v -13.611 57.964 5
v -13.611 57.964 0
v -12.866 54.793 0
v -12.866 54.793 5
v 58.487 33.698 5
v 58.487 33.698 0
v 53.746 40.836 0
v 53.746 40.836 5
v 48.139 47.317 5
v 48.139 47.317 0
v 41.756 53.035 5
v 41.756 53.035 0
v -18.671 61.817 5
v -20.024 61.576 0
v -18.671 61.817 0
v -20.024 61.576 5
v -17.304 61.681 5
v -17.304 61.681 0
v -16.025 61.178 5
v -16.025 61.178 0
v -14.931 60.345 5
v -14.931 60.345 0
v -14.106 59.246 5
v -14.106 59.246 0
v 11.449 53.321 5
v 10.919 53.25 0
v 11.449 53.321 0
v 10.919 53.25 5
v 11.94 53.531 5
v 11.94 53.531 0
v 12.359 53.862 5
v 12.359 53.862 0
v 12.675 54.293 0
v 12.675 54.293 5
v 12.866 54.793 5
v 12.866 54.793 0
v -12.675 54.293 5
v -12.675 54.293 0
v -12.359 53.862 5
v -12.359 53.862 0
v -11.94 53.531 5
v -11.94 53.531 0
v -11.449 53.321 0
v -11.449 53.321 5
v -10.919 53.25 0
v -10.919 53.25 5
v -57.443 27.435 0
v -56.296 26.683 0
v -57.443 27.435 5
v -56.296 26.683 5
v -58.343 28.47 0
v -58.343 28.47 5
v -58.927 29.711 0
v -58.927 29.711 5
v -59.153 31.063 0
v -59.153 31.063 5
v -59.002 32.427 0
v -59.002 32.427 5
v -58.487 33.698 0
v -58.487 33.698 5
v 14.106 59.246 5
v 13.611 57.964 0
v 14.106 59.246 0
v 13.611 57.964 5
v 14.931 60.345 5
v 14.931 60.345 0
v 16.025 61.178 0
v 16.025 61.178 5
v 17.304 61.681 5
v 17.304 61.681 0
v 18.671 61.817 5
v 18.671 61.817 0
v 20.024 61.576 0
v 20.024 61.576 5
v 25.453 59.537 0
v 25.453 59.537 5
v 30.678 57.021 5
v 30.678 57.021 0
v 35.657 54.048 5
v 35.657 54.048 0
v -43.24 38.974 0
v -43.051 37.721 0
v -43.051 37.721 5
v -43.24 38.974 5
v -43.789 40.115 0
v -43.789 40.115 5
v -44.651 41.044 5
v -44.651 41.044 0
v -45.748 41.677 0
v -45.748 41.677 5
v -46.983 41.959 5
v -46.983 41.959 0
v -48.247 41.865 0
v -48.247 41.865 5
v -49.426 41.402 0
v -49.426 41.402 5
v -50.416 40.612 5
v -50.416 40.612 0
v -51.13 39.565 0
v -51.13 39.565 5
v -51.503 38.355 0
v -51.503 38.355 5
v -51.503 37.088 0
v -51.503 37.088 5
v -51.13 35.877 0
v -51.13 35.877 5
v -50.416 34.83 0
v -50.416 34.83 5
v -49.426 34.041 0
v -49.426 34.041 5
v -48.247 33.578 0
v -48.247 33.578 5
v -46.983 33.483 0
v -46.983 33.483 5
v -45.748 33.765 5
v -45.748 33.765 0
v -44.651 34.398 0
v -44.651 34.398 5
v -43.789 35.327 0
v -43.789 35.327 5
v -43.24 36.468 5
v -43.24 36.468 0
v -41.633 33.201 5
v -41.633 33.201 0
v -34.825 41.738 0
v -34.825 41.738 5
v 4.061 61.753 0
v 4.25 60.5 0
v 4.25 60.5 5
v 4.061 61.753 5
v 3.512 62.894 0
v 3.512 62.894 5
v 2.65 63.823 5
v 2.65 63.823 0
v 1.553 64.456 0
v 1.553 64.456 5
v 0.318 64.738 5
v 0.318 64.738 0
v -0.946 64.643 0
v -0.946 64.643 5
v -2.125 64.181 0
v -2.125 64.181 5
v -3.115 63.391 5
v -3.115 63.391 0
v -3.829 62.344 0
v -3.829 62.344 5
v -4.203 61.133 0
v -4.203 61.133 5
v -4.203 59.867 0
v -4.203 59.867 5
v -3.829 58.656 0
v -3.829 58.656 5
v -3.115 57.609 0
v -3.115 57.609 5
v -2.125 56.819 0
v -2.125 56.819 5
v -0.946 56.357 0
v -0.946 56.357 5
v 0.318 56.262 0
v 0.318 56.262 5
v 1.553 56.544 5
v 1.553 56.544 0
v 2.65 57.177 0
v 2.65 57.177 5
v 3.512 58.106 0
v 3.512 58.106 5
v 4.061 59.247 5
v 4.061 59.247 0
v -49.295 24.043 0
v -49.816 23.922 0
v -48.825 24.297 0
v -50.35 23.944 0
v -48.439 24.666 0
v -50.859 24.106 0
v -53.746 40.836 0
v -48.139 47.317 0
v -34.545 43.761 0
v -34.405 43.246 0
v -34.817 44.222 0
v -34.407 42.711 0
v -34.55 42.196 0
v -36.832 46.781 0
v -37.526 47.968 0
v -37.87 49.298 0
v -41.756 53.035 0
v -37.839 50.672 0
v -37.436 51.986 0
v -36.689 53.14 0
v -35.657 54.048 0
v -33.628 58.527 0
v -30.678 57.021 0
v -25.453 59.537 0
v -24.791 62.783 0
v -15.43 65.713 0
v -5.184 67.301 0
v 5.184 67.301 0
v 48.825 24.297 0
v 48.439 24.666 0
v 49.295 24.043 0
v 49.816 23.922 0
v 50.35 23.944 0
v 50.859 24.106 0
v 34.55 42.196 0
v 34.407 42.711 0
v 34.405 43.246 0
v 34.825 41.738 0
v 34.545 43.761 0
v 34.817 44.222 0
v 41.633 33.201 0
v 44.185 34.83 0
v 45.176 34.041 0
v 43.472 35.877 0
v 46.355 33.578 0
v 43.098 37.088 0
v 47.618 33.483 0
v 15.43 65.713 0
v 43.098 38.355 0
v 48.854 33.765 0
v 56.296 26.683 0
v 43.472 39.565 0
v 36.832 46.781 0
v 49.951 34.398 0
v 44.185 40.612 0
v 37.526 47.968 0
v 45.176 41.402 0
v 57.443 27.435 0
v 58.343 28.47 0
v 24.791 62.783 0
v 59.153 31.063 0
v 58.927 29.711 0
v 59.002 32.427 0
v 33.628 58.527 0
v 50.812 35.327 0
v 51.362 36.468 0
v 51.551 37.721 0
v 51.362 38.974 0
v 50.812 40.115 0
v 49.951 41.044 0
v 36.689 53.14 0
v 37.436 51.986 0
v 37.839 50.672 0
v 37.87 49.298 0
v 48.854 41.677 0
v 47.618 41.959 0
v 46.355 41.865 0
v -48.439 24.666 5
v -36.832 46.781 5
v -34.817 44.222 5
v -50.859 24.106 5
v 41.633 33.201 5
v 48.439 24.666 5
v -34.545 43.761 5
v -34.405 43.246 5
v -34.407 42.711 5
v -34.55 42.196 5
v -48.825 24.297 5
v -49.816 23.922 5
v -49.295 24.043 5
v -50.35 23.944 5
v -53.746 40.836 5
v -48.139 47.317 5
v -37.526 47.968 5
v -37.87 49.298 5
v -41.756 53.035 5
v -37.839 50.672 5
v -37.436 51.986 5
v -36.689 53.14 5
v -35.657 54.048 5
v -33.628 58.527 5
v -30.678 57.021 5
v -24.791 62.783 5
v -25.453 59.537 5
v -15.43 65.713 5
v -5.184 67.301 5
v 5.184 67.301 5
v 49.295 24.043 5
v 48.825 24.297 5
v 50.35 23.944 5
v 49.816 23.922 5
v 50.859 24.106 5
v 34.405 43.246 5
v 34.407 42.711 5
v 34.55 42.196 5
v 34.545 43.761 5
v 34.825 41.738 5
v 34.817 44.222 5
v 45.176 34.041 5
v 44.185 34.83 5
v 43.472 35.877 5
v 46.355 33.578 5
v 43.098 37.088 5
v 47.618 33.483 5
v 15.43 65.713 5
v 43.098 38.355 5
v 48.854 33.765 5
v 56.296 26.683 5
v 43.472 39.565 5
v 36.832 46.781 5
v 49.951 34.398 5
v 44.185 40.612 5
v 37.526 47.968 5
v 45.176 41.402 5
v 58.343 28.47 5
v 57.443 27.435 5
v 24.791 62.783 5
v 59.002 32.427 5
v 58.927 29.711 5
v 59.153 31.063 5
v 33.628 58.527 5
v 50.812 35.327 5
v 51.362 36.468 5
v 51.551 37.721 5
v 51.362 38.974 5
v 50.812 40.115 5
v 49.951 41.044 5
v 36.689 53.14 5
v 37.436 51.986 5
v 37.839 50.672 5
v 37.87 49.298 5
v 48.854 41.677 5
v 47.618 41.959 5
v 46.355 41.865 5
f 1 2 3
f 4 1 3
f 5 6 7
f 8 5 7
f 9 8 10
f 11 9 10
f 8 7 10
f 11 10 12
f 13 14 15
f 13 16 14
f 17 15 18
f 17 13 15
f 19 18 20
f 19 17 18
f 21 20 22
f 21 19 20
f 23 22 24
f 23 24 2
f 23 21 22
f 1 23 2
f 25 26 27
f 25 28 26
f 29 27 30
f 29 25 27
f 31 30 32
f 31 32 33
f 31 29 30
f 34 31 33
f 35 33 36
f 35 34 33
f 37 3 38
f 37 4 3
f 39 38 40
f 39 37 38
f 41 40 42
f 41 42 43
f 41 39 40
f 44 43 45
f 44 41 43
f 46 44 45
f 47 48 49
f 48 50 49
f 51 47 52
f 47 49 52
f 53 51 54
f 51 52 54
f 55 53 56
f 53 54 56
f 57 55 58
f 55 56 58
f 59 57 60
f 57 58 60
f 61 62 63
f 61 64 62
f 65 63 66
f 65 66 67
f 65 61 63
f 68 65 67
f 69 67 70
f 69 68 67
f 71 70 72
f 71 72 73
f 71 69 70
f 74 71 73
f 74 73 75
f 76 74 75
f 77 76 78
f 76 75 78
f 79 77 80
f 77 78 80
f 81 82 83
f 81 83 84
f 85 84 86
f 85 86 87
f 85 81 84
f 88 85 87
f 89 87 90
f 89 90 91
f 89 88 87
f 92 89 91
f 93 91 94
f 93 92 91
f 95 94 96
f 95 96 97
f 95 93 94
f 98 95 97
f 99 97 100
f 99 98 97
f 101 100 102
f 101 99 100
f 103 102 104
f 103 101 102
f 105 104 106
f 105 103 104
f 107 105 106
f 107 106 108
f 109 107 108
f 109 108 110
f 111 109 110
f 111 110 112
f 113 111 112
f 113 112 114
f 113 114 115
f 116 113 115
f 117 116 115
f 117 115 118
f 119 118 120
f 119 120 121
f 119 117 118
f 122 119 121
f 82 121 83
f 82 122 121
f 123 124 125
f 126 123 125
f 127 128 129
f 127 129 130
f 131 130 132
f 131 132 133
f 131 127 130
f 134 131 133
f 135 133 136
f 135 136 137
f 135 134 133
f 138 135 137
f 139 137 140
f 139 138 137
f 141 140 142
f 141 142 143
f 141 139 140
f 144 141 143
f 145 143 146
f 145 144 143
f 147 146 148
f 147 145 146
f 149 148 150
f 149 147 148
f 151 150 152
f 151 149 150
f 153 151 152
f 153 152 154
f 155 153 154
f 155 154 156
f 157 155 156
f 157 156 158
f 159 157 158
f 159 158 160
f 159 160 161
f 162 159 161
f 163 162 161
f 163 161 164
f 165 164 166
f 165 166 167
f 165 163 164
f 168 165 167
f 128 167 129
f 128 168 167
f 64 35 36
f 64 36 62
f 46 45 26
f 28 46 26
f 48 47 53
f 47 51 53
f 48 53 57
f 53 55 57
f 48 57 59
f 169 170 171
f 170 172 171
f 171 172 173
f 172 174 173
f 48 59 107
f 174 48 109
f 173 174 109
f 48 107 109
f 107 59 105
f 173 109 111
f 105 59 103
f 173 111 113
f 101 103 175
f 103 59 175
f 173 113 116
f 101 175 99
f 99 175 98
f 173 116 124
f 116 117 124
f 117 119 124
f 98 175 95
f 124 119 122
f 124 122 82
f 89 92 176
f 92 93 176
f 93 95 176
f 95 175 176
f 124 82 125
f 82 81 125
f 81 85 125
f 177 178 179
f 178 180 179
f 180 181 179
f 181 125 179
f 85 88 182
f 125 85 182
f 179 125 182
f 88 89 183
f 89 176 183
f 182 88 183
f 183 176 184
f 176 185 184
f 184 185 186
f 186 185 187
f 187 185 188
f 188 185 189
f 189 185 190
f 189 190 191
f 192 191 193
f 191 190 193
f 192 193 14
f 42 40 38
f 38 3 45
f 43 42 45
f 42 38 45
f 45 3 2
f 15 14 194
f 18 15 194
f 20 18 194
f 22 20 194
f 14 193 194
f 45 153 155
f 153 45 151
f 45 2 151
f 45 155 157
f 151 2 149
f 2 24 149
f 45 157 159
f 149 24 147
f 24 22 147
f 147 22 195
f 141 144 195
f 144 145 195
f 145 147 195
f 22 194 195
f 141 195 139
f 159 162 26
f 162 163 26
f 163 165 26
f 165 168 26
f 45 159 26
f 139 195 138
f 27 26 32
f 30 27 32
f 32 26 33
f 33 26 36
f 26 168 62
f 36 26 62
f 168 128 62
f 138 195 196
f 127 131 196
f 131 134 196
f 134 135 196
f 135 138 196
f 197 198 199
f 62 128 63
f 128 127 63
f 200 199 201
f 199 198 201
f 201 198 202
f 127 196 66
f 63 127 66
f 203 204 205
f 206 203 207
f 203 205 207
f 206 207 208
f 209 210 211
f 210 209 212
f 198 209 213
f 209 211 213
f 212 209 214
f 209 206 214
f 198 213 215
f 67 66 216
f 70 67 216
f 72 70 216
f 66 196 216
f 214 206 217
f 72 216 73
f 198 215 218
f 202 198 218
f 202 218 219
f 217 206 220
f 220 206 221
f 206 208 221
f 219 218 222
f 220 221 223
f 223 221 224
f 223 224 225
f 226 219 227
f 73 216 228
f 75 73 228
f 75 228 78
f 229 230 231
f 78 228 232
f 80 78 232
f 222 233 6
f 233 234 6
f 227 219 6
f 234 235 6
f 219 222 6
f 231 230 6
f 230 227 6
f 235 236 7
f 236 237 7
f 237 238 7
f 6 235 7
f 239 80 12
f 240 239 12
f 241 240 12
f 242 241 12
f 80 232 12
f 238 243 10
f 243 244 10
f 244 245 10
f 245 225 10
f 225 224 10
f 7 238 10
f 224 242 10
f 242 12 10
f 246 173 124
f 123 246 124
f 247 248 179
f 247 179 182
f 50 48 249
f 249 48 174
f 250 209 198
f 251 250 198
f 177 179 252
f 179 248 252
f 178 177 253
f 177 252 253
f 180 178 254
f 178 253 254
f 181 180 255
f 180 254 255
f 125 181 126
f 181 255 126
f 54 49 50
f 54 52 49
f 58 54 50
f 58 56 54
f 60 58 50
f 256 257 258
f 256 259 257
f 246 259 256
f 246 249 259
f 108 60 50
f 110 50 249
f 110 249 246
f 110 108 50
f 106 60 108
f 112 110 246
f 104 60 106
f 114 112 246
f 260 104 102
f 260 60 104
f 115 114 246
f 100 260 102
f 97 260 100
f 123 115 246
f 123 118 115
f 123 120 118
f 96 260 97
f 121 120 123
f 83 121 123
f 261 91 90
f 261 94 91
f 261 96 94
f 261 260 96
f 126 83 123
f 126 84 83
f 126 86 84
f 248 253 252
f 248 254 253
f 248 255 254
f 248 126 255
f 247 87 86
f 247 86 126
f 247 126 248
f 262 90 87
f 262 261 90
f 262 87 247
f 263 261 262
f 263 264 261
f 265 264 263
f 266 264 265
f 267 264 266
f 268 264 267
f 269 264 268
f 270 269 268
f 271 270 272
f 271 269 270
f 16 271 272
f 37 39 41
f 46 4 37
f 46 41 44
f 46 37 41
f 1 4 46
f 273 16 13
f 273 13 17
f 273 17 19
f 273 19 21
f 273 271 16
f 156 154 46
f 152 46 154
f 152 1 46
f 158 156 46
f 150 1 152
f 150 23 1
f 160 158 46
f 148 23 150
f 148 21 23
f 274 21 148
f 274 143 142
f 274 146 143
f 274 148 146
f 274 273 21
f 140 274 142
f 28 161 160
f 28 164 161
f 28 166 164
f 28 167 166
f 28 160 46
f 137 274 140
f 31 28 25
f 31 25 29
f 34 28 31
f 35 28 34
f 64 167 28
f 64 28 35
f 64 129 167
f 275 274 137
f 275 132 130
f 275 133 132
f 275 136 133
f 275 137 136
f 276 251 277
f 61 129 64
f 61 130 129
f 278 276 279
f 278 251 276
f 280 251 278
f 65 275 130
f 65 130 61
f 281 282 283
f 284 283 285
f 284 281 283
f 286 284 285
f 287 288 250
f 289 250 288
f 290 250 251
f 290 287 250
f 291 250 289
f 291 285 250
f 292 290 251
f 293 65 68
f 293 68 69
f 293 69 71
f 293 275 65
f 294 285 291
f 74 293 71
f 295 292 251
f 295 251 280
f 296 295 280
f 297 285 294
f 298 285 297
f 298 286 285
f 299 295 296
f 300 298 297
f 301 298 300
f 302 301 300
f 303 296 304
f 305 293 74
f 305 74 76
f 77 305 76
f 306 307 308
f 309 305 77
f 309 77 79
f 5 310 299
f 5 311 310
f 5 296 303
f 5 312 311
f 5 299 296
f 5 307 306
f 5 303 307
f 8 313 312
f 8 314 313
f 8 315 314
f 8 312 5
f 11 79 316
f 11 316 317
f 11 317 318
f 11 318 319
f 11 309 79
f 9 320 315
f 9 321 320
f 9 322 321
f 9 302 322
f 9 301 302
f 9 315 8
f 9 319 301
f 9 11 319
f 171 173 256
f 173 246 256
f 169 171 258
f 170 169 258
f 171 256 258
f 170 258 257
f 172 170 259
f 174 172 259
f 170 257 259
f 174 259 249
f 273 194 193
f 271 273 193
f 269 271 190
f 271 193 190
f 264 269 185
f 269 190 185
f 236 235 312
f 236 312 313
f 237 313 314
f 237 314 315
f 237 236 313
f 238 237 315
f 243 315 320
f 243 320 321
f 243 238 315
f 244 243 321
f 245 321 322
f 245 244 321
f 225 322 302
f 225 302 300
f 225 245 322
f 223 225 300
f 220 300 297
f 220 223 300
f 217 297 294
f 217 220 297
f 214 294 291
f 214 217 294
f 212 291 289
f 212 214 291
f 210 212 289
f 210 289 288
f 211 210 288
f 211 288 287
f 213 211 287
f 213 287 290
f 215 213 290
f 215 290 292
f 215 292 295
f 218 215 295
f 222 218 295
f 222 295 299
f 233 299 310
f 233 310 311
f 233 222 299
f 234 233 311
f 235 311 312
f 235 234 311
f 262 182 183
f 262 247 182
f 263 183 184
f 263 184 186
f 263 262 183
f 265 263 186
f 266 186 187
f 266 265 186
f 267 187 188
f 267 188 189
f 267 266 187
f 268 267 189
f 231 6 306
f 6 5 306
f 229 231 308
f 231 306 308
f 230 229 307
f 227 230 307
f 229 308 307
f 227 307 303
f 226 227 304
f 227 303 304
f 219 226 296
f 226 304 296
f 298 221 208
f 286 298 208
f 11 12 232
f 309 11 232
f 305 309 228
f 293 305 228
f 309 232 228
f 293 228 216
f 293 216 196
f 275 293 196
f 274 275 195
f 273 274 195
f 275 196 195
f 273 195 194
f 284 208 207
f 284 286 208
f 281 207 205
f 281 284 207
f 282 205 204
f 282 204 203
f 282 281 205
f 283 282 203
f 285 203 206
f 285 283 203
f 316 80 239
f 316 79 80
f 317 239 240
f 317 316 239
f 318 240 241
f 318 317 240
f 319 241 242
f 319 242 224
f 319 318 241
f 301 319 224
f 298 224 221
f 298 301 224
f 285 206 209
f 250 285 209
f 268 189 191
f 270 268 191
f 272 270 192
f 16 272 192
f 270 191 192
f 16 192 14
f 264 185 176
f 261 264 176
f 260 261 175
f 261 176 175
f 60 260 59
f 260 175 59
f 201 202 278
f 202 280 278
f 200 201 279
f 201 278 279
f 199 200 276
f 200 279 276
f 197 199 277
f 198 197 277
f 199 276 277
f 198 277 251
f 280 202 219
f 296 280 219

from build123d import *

# Parameters (mm, degrees)
ESQUISSE2_R        = 4.25
BOSS_EXTRU_1_DEPTH = 5
CONG_1_R           = 5
CONG_2_R           = 2


with BuildPart() as part:
    # Esquisse2 → Boss.-Extru.1 (new body)
    with BuildSketch(Plane.XY):
        with BuildLine():
            Line((-41.632526167, 33.200832294), (-33.836607647, 42.976604913))
            Line((-33.836607647, 42.976604913), (-40.054629461, 50.874248484))
            Line((-40.054629461, 50.874248484), (-41.75579133, 53.034930852))
            ThreePointArc((-41.75579133, 53.034930852), (-52.772575719, 42.086877432), (-60.995330499, 28.91054578))
            Line((-60.995330499, 28.91054578), (-49.426698361, 23.427249496))
            Line((-49.426698361, 23.427249496), (-41.632526167, 33.200832294))
        make_face()
        with Locations((-47.300804689, 37.721133012)):
            Circle(ESQUISSE2_R, mode=Mode.SUBTRACT)
        with BuildLine():
            Line((-41.75579133, 53.034930852), (-40.054629461, 50.874248484))
            ThreePointArc((-40.054629461, 50.874248484), (-28.093972108, 58.337734197), (-14.801436125, 63.035545438))
            Line((-14.801436125, 63.035545438), (-15.430068548, 65.712730765))
            ThreePointArc((-15.430068548, 65.712730765), (-29.28715239, 60.815398583), (-41.75579133, 53.034930852))
        make_face()
        with BuildLine():
            Line((-14.801436125, 63.035545438), (-12.503682933, 53.25))
            Line((-12.503682933, 53.25), (0, 53.25))
            Line((0, 53.25), (12.503682933, 53.25))
            Line((12.503682933, 53.25), (14.801436125, 63.035545438))
            Line((14.801436125, 63.035545438), (15.430068548, 65.712730765))
            ThreePointArc((15.430068548, 65.712730765), (0, 67.5), (-15.430068548, 65.712730765))
            Line((-15.430068548, 65.712730765), (-14.801436125, 63.035545438))
        make_face()
        with Locations((0, 60.5)):
            Circle(ESQUISSE2_R, mode=Mode.SUBTRACT)
        with BuildLine():
            Line((15.430068548, 65.712730765), (14.801436125, 63.035545438))
            ThreePointArc((14.801436125, 63.035545438), (28.093972108, 58.337734197), (40.054629461, 50.874248484))
            Line((40.054629461, 50.874248484), (41.75579133, 53.034930852))
            ThreePointArc((41.75579133, 53.034930852), (29.28715239, 60.815398583), (15.430068548, 65.712730765))
        make_face()
        with BuildLine():
            Line((41.75579133, 53.034930852), (40.054629461, 50.874248484))
            Line((40.054629461, 50.874248484), (33.836607647, 42.976604913))
            Line((33.836607647, 42.976604913), (41.632526363, 33.200832047))
            Line((41.632526363, 33.200832047), (49.426698361, 23.427249496))
            Line((49.426698361, 23.427249496), (60.995330499, 28.91054578))
            ThreePointArc((60.995330499, 28.91054578), (52.772575719, 42.086877432), (41.75579133, 53.034930852))
        make_face()
        with Locations((47.300804689, 37.721133012)):
            Circle(ESQUISSE2_R, mode=Mode.SUBTRACT)
    extrude(amount=BOSS_EXTRU_1_DEPTH)

    # Congé1
    cong_1_edges = [part.edges().sort_by_distance(p)[0] for p in [
        (60.995330499, 28.91054578, 2.5),
        (40.054629461, 50.874248484, 2.5),
        (14.801436125, 63.035545438, 2.5),
        (-14.801436125, 63.035545438, 2.5),
        (-40.054629461, 50.874248484, 2.5),
        (-60.995330499, 28.91054578, 2.5),
    ]]
    fillet(cong_1_edges, radius=CONG_1_R)

    # Congé2
    cong_2_edges = [part.edges().sort_by_distance(p)[0] for p in [
        (49.426698361, 23.427249496, 2.5),
        (33.836607647, 42.976604913, 2.5),
        (12.503682933, 53.25, 2.5),
        (-12.503682933, 53.25, 2.5),
        (-33.836607647, 42.976604913, 2.5),
        (-49.426698361, 23.427249496, 2.5),
    ]]
    fillet(cong_2_edges, radius=CONG_2_R)


solid = part.part
